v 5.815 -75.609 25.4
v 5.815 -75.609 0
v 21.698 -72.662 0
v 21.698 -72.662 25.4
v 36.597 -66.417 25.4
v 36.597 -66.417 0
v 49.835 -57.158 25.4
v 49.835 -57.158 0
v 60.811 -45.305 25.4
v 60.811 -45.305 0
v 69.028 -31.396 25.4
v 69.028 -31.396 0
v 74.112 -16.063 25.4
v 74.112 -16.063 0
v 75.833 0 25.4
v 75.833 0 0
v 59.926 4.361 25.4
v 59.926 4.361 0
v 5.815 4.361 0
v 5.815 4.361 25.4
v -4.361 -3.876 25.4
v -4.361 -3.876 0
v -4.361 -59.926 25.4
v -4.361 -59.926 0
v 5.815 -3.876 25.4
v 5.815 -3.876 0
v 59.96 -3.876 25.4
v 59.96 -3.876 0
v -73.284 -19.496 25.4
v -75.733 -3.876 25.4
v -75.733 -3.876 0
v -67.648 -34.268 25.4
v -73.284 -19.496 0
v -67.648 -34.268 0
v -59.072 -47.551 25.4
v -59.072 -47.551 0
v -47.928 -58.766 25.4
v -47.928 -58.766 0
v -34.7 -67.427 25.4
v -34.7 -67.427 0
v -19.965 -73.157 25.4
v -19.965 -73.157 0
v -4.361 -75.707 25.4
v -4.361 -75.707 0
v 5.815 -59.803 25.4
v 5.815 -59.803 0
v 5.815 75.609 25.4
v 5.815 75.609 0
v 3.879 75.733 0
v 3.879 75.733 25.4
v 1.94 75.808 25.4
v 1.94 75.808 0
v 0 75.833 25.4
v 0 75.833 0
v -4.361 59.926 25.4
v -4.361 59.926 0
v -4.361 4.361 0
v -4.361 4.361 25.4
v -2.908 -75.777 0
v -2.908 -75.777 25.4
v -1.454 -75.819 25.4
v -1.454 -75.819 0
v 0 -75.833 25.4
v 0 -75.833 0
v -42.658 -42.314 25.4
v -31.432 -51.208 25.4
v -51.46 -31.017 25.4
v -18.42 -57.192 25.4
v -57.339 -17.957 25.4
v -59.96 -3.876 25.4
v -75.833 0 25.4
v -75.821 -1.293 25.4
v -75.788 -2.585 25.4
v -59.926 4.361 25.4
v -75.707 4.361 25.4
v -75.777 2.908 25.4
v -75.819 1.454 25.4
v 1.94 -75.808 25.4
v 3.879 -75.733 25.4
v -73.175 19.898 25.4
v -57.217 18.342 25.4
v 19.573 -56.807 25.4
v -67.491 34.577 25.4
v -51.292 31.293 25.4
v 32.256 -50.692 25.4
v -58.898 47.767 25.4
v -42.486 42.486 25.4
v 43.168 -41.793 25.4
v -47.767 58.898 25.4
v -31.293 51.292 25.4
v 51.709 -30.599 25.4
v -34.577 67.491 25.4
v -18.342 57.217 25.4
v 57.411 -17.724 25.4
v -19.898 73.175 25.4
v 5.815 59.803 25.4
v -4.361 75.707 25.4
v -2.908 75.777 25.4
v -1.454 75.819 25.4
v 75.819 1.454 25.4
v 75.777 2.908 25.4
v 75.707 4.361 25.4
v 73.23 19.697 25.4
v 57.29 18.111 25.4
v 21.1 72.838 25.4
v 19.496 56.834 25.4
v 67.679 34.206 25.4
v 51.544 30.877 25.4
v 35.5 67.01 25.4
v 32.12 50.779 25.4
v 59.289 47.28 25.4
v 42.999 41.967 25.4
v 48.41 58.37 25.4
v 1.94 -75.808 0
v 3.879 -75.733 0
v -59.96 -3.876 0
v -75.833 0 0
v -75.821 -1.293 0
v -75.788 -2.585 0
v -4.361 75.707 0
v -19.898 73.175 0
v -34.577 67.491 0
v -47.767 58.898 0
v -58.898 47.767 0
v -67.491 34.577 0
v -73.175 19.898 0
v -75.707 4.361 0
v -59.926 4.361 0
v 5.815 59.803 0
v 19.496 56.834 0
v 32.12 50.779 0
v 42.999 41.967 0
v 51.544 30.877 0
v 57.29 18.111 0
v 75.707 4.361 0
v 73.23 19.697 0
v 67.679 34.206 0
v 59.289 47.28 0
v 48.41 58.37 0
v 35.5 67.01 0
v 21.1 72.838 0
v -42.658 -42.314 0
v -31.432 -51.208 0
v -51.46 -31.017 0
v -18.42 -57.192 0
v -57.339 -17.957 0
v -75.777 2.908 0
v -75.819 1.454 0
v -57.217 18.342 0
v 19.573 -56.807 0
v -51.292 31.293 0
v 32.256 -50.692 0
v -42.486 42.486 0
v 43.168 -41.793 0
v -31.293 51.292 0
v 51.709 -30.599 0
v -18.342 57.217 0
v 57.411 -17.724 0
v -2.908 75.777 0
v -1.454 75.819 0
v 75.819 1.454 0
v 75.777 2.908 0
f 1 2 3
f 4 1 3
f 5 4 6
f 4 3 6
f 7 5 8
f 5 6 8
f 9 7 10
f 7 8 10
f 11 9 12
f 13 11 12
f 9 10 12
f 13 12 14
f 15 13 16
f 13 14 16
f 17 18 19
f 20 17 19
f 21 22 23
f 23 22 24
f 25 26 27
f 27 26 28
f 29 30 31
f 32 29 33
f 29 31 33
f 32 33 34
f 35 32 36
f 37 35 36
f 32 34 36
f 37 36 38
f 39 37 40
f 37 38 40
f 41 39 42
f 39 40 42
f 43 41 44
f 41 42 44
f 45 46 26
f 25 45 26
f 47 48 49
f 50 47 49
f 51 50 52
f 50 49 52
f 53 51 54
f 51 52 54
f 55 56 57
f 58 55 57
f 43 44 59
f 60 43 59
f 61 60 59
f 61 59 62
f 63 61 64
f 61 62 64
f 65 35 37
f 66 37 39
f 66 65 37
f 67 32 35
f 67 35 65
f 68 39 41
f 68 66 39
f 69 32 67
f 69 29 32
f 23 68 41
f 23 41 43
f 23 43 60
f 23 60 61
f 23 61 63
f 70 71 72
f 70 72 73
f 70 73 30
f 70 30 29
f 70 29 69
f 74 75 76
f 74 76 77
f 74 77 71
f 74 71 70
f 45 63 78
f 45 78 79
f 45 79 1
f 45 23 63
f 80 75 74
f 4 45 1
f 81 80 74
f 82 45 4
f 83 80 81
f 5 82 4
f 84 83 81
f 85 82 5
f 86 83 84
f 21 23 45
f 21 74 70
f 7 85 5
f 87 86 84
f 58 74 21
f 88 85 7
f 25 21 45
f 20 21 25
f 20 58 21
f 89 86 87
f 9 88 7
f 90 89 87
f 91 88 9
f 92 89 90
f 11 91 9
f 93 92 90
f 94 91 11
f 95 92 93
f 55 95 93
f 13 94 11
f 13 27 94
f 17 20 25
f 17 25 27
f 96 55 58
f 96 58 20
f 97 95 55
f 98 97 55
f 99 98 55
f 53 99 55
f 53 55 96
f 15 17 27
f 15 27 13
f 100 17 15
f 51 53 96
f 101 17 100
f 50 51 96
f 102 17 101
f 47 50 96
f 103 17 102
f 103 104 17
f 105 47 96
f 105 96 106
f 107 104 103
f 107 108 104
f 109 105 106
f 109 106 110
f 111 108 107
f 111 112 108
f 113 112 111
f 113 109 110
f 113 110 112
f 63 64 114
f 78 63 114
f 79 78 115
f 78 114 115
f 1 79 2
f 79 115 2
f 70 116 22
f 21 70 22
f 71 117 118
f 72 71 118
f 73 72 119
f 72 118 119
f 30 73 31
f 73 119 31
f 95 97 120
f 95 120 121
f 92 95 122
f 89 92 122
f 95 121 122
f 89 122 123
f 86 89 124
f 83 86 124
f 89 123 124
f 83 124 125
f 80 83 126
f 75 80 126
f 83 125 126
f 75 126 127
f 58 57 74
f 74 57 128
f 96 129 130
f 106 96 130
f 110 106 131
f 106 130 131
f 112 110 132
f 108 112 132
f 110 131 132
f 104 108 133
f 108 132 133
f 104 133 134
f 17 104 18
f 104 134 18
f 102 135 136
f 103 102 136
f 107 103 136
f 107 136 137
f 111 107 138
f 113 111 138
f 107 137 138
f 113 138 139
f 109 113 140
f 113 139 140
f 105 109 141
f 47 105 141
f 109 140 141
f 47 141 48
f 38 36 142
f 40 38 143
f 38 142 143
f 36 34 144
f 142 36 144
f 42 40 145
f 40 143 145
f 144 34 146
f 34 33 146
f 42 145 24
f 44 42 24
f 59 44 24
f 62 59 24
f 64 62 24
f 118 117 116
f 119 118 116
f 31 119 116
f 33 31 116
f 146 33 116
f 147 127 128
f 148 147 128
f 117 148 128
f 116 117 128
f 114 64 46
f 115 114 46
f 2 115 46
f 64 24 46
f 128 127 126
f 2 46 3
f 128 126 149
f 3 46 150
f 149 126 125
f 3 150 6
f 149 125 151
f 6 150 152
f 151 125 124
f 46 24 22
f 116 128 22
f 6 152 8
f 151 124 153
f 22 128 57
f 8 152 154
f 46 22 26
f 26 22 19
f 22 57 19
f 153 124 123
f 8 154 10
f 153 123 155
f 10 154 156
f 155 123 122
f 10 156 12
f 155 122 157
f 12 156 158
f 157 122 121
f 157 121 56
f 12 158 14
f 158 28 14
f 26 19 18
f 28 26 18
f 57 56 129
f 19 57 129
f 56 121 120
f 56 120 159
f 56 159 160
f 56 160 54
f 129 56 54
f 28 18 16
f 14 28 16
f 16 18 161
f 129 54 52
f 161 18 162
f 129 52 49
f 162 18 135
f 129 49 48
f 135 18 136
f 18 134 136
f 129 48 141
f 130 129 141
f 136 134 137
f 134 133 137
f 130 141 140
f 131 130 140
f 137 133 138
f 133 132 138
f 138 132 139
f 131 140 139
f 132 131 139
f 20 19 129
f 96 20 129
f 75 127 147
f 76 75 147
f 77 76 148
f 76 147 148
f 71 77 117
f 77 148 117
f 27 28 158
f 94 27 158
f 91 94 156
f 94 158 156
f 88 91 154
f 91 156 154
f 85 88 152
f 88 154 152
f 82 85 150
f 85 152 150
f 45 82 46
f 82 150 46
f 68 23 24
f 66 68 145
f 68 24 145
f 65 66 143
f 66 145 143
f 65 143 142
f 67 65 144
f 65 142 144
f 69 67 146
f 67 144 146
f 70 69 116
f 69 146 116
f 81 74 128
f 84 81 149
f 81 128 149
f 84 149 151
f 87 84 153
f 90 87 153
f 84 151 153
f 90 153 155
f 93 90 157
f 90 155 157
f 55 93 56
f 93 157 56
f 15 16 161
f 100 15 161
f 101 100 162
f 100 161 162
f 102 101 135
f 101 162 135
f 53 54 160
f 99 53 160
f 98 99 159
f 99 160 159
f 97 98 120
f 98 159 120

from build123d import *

# Parameters (mm, degrees)
F0_W     = 5.8146030642
F0_H     = 3.8764025085
F1_DEPTH = 25.4


with BuildPart() as f1:
    # F0 (on Top) → F1 (new body)
    with BuildSketch(Plane.XY):
        with BuildLine():
            Line((60.0847271035, 0), (75.8325080935, 0))
            ThreePointArc((75.8325080935, 0), (75.8011270946, 2.1813791382), (75.7070100699, 4.3609528802))
            Line((75.7070100699, 4.3609528802), (59.9262590279, 4.3609528802))
            ThreePointArc((59.9262590279, 4.3609528802), (60.0450970152, 2.1819155663), (60.0847271035, 0))
        make_face()
        with BuildLine():
            ThreePointArc((5.8146030642, -75.6092565428), (55.6394878556, -51.524913148), (75.8325080935, 0))
            Line((75.8325080935, 0), (60.0847271035, 0))
            ThreePointArc((60.0847271035, 0), (60.0534252964, -1.939211508), (59.9595524891, -3.8764025085))
            ThreePointArc((59.9595524891, -3.8764025085), (43.1682524028, -41.793258016), (5.8146030642, -59.8027158439))
            Line((5.8146030642, -59.8027158439), (5.8146030642, -75.6092565428))
        make_face()
        with BuildLine():
            Line((59.9262590279, 4.3609528802), (75.7070100699, 4.3609528802))
            ThreePointArc((75.7070100699, 4.3609528802), (54.1343102449, 53.1041028364), (5.8146030642, 75.6092565428))
            Line((5.8146030642, 75.6092565428), (5.8146030642, 59.8027158439))
            ThreePointArc((5.8146030642, 59.8027158439), (42.9989826308, 41.9673911962), (59.9262590279, 4.3609528802))
        make_face()
        with BuildLine():
            ThreePointArc((0, -75.8325080935), (2.9094436775, -75.7766746515), (5.8146030642, -75.6092565428))
            Line((5.8146030642, -75.6092565428), (5.8146030642, -59.8027158439))
            ThreePointArc((5.8146030642, -59.8027158439), (2.9107189466, -60.0141828763), (0, -60.0847271035))
            Line((0, -60.0847271035), (0, -75.8325080935))
        make_face()
        with BuildLine():
            Line((5.8146030642, 0), (60.0847271035, 0))
            ThreePointArc((60.0847271035, 0), (60.0450970152, 2.1819155663), (59.9262590279, 4.3609528802))
            Line((59.9262590279, 4.3609528802), (5.8146030642, 4.3609528802))
            Line((5.8146030642, 4.3609528802), (0, 4.3609528802))
            Line((0, 4.3609528802), (0, 0))
            Line((0, 0), (5.8146030642, 0))
        make_face()
        with BuildLine():
            ThreePointArc((59.9595524891, -3.8764025085), (60.0534252964, -1.939211508), (60.0847271035, 0))
            Line((60.0847271035, 0), (5.8146030642, 0))
            Line((5.8146030642, 0), (5.8146030642, -3.8764025085))
            Line((5.8146030642, -3.8764025085), (59.9595524891, -3.8764025085))
        make_face()
        with BuildLine():
            Line((5.8146030642, 59.8027158439), (5.8146030642, 75.6092565428))
            ThreePointArc((5.8146030642, 75.6092565428), (2.9094436775, 75.7766746515), (0, 75.8325080935))
            Line((0, 75.8325080935), (0, 60.0847271035))
            ThreePointArc((0, 60.0847271035), (2.9107189466, 60.0141828763), (5.8146030642, 59.8027158439))
        make_face()
        with BuildLine():
            ThreePointArc((-4.3609519489, -75.7070101236), (-2.1813786719, -75.801127108), (0, -75.8325080935))
            Line((0, -75.8325080935), (0, -60.0847271035))
            ThreePointArc((0, -60.0847271035), (-2.1819150998, -60.0450970321), (-4.3609519489, -59.9262590956))
            Line((-4.3609519489, -59.9262590956), (-4.3609519489, -75.7070101236))
        make_face()
        with BuildLine():
            ThreePointArc((0, -60.0847271035), (2.9107189466, -60.0141828763), (5.8146030642, -59.8027158439))
            Line((5.8146030642, -59.8027158439), (5.8146030642, -3.8764025085))
            Line((5.8146030642, -3.8764025085), (0, -3.8764025085))
            Line((0, -3.8764025085), (0, -60.0847271035))
        make_face()
        with Locations((2.9073015321, -1.9382012542)):
            Rectangle(F0_W, F0_H)
        with BuildLine():
            Line((0, 60.0847271035), (0, 75.8325080935))
            ThreePointArc((0, 75.8325080935), (-2.1813786719, 75.801127108), (-4.3609519489, 75.7070101236))
            Line((-4.3609519489, 75.7070101236), (-4.3609519489, 59.9262590956))
            ThreePointArc((-4.3609519489, 59.9262590956), (-2.1819150998, 60.0450970321), (0, 60.0847271035))
        make_face()
        with BuildLine():
            Line((5.8146030642, 4.3609528802), (5.8146030642, 59.8027158439))
            ThreePointArc((5.8146030642, 59.8027158439), (2.9107189466, 60.0141828763), (0, 60.0847271035))
            Line((0, 60.0847271035), (0, 4.3609528802))
            Line((0, 4.3609528802), (5.8146030642, 4.3609528802))
        make_face()
        with BuildLine():
            ThreePointArc((-75.733366407, -3.8764025085), (-53.7929735729, -53.4498388953), (-4.3609519489, -75.7070101236))
            Line((-4.3609519489, -75.7070101236), (-4.3609519489, -59.9262590956))
            ThreePointArc((-4.3609519489, -59.9262590956), (-42.6576889746, -42.3142529468), (-59.9595524891, -3.8764025085))
            Line((-59.9595524891, -3.8764025085), (-75.733366407, -3.8764025085))
        make_face()
        with BuildLine():
            ThreePointArc((-4.3609519489, -59.9262590956), (-2.1819150998, -60.0450970321), (0, -60.0847271035))
            Line((0, -60.0847271035), (0, -3.8764025085))
            Line((0, -3.8764025085), (-4.3609519489, -3.8764025085))
            Line((-4.3609519489, -3.8764025085), (-4.3609519489, -59.9262590956))
        make_face()
        with BuildLine():
            Line((0, -3.8764025085), (0, 0))
            Line((0, 0), (0, 4.3609528802))
            Line((0, 4.3609528802), (0, 60.0847271035))
            ThreePointArc((0, 60.0847271035), (-2.1819150998, 60.0450970321), (-4.3609519489, 59.9262590956))
            Line((-4.3609519489, 59.9262590956), (-4.3609519489, 4.3609528802))
            Line((-4.3609519489, 4.3609528802), (-4.3609519489, 0))
            Line((-4.3609519489, 0), (-4.3609519489, -3.8764025085))
            Line((-4.3609519489, -3.8764025085), (0, -3.8764025085))
        make_face()
        with BuildLine():
            Line((-4.3609519489, 59.9262590956), (-4.3609519489, 75.7070101236))
            ThreePointArc((-4.3609519489, 75.7070101236), (-53.6216803775, 53.6216810371), (-75.7070100699, 4.3609528802))
            Line((-75.7070100699, 4.3609528802), (-59.9262590279, 4.3609528802))
            ThreePointArc((-59.9262590279, 4.3609528802), (-42.4863176505, 42.4863183108), (-4.3609519489, 59.9262590956))
        make_face()
        with BuildLine():
            ThreePointArc((-75.8325080935, 0), (-75.8077186201, -1.938835055), (-75.733366407, -3.8764025085))
            Line((-75.733366407, -3.8764025085), (-59.9595524891, -3.8764025085))
            ThreePointArc((-59.9595524891, -3.8764025085), (-60.0534252964, -1.939211508), (-60.0847271035, 0))
            Line((-60.0847271035, 0), (-75.8325080935, 0))
        make_face()
        with BuildLine():
            Line((-59.9262590279, 4.3609528802), (-75.7070100699, 4.3609528802))
            ThreePointArc((-75.7070100699, 4.3609528802), (-75.8011270946, 2.1813791382), (-75.8325080935, 0))
            Line((-75.8325080935, 0), (-60.0847271035, 0))
            ThreePointArc((-60.0847271035, 0), (-60.0450970152, 2.1819155663), (-59.9262590279, 4.3609528802))
        make_face()
        with BuildLine():
            ThreePointArc((-60.0847271035, 0), (-60.0534252964, -1.939211508), (-59.9595524891, -3.8764025085))
            Line((-59.9595524891, -3.8764025085), (-4.3609519489, -3.8764025085))
            Line((-4.3609519489, -3.8764025085), (-4.3609519489, 0))
            Line((-4.3609519489, 0), (-60.0847271035, 0))
        make_face()
        with BuildLine():
            Line((-4.3609519489, 4.3609528802), (-59.9262590279, 4.3609528802))
            ThreePointArc((-59.9262590279, 4.3609528802), (-60.0450970152, 2.1819155663), (-60.0847271035, 0))
            Line((-60.0847271035, 0), (-4.3609519489, 0))
            Line((-4.3609519489, 0), (-4.3609519489, 4.3609528802))
        make_face()
    extrude(amount=F1_DEPTH)


solid = f1.part
